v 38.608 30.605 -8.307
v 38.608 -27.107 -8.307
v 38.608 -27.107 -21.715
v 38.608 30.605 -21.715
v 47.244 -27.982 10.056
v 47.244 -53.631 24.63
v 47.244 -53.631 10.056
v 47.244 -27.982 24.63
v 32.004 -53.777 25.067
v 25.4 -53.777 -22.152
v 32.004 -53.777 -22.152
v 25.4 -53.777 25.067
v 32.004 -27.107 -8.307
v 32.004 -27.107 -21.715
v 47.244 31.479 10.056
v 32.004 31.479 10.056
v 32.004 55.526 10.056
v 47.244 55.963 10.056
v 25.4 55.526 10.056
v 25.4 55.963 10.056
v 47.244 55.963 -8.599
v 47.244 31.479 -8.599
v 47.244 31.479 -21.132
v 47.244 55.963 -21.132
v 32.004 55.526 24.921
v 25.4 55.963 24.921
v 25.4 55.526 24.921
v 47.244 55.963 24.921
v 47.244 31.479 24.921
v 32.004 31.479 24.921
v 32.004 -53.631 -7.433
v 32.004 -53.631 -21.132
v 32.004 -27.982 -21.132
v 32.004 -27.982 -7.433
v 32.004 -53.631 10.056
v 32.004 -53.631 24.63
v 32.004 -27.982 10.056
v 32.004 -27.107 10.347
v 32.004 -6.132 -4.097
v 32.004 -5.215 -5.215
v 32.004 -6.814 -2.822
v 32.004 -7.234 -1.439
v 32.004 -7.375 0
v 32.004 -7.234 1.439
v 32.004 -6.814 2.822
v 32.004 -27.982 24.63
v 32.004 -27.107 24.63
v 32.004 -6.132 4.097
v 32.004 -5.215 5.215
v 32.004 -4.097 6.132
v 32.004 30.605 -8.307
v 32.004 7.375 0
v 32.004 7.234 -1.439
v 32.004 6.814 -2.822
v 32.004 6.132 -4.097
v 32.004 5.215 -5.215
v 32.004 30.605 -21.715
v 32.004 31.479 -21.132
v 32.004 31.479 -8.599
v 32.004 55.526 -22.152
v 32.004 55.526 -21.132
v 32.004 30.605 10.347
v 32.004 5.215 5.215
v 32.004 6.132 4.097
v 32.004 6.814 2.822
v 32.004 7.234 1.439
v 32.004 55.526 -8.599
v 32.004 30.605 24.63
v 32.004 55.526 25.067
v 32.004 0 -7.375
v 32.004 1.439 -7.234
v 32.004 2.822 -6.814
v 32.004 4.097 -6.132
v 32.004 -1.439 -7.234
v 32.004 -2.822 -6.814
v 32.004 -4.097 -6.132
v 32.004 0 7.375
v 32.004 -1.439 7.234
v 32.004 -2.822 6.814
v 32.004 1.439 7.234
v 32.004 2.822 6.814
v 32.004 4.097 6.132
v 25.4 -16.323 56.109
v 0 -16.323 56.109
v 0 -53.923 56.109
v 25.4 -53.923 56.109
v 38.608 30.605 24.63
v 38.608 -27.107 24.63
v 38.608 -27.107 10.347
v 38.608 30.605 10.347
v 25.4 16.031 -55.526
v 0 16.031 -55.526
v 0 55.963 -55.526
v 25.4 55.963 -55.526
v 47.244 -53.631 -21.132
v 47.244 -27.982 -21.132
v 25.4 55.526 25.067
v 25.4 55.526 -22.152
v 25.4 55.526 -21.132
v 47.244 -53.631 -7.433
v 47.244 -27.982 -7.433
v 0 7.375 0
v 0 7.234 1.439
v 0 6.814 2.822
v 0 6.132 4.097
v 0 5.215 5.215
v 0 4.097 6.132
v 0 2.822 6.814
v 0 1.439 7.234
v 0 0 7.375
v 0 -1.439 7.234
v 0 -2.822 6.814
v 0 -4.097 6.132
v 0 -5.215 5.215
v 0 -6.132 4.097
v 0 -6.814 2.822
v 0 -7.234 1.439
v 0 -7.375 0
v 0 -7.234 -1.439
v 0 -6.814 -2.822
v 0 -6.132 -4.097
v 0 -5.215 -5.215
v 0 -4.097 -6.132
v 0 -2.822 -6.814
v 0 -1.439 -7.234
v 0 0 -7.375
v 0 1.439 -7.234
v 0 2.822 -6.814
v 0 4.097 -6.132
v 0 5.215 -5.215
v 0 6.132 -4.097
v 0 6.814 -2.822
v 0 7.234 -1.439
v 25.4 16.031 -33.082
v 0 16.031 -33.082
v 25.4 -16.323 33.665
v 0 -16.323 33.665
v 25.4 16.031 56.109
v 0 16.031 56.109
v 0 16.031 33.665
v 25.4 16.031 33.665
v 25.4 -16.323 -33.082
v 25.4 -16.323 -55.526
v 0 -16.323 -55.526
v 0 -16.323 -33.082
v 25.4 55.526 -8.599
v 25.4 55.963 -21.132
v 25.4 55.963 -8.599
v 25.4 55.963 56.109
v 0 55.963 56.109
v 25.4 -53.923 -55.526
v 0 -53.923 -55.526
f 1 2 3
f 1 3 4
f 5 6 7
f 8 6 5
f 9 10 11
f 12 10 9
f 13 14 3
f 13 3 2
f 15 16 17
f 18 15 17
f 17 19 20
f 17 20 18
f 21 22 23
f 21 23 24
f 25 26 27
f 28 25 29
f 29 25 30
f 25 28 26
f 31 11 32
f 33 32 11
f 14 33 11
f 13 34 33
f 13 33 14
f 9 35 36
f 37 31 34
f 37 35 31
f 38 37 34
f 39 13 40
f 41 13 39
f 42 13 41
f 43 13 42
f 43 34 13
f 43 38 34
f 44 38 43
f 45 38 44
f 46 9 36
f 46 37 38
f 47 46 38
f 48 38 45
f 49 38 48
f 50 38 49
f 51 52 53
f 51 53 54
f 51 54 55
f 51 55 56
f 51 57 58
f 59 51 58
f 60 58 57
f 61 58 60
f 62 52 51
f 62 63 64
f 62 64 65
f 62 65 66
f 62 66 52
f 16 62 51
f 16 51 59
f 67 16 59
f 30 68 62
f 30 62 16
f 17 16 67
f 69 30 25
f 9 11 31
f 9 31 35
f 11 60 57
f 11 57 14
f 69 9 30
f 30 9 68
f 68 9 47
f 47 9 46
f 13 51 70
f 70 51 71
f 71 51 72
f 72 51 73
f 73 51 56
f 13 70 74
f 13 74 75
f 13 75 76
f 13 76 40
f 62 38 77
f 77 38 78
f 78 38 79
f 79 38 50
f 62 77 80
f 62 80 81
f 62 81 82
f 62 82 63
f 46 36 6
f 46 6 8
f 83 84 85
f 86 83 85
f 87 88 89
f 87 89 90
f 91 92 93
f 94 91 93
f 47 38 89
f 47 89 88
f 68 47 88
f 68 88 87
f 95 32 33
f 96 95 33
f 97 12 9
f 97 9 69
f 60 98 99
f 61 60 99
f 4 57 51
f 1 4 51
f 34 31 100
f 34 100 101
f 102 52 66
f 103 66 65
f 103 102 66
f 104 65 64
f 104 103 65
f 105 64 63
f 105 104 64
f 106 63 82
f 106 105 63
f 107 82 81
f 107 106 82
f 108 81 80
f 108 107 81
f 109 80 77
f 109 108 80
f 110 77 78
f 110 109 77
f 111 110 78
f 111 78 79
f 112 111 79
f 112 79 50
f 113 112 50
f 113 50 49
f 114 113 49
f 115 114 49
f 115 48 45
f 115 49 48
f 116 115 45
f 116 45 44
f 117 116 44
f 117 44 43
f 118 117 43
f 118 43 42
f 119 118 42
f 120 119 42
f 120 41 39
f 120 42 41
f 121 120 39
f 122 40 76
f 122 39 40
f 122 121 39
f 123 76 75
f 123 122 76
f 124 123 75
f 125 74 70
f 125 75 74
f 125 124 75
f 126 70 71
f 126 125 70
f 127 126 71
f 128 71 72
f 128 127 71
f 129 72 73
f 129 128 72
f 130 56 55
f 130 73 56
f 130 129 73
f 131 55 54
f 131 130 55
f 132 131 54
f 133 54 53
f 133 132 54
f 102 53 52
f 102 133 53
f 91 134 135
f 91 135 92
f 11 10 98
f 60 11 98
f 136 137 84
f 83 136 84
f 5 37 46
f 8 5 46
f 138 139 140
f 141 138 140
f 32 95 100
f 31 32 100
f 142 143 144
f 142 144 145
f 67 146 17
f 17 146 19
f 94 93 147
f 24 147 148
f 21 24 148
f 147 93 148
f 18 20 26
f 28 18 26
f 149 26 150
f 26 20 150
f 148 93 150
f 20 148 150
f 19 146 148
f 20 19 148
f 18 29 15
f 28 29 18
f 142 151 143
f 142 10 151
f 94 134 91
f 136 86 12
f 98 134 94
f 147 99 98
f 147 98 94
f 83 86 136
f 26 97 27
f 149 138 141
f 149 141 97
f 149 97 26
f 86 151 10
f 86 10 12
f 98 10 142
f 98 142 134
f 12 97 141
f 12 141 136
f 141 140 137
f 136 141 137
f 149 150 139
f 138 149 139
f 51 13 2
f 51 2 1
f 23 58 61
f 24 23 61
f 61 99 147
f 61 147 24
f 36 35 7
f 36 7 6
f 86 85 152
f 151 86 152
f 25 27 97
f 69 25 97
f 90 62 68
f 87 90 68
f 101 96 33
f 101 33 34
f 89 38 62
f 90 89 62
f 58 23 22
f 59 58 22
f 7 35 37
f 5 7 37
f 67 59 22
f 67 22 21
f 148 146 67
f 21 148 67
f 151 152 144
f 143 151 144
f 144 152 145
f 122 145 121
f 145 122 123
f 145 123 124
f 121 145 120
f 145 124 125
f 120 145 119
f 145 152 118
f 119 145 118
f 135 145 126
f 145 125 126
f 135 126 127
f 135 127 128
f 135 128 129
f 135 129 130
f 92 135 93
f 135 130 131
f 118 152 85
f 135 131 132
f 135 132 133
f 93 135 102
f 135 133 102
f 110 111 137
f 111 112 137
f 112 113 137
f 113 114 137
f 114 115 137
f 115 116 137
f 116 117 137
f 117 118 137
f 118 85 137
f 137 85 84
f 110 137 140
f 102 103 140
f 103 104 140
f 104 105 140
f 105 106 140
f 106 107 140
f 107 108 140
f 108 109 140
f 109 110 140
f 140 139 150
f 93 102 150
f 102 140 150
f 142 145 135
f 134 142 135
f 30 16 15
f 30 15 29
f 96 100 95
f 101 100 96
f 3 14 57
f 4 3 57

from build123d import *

# Parameters (mm, degrees)
F1_DEPTH = 25.4
F2_W     = 109.303277
F2_H     = 47.219016
F3_DEPTH = 32.004
F4_W     = 25.649838
F4_H     = 14.573772
F4_H_2   = 13.699345
F4_W_2   = 0.291478
F4_H_3   = 14.865246
F4_W_3   = 24.192456
F4_W_4   = 24.483934
F4_H_4   = 12.533444
F5_DEPTH = 47.244
F6_W     = 57.712132
F6_H     = 14.282296
F6_H_2   = 13.407867
F7_DEPTH = 38.608
F8_R     = 7.375251
F9_DEPTH = 65.278


with BuildPart() as f1:
    # F0 (on Right) → F1 (new body)
    with BuildSketch(Plane.YZ):
        Polygon((-16.322624, 56.109019), (-53.922951, 56.109019), (-53.922951, -55.526067), (-16.322624, -55.526067), (-16.322624, -33.082449), (16.031148, -33.082449), (16.031148, -55.526067), (55.963278, -55.526067), (55.963278, 56.109019), (16.031148, 56.109019), (16.031148, 33.665407), (-16.322624, 33.665407), align=None)
    extrude(amount=F1_DEPTH)

    # F2 (on Right) → F3 (join)
    with BuildSketch(Plane.YZ):
        with Locations((0.874429, 1.457378)):
            Rectangle(F2_W, F2_H)
    extrude(amount=F3_DEPTH)

    # F4 (on Right) → F5 (join)
    with BuildSketch(Plane.YZ):
        with Locations((-40.806558, 17.342787)):
            Rectangle(F4_W, F4_H)
        with Locations((-40.806558, -14.282296)):
            Rectangle(F4_W, F4_H_2)
        with Locations((55.817539, 17.488524)):
            Rectangle(F4_W_2, F4_H_3)
        with Locations((43.575572, 17.488524)):
            Rectangle(F4_W_3, F4_H_3)
        with Locations((43.721311, -14.865246)):
            Rectangle(F4_W_4, F4_H_4)
    extrude(amount=F5_DEPTH)

    # F6 (on Right) → F7 (join)
    with BuildSketch(Plane.YZ):
        with Locations((1.748853, 17.488525)):
            Rectangle(F6_W, F6_H)
        with Locations((1.748853, -15.010982)):
            Rectangle(F6_W, F6_H_2)
    extrude(amount=F7_DEPTH)

    # F8 (on Right) → F9 (cut)
    with BuildSketch(Plane.YZ):
        Circle(F8_R)
    extrude(amount=F9_DEPTH, mode=Mode.SUBTRACT)


solid = f1.part
